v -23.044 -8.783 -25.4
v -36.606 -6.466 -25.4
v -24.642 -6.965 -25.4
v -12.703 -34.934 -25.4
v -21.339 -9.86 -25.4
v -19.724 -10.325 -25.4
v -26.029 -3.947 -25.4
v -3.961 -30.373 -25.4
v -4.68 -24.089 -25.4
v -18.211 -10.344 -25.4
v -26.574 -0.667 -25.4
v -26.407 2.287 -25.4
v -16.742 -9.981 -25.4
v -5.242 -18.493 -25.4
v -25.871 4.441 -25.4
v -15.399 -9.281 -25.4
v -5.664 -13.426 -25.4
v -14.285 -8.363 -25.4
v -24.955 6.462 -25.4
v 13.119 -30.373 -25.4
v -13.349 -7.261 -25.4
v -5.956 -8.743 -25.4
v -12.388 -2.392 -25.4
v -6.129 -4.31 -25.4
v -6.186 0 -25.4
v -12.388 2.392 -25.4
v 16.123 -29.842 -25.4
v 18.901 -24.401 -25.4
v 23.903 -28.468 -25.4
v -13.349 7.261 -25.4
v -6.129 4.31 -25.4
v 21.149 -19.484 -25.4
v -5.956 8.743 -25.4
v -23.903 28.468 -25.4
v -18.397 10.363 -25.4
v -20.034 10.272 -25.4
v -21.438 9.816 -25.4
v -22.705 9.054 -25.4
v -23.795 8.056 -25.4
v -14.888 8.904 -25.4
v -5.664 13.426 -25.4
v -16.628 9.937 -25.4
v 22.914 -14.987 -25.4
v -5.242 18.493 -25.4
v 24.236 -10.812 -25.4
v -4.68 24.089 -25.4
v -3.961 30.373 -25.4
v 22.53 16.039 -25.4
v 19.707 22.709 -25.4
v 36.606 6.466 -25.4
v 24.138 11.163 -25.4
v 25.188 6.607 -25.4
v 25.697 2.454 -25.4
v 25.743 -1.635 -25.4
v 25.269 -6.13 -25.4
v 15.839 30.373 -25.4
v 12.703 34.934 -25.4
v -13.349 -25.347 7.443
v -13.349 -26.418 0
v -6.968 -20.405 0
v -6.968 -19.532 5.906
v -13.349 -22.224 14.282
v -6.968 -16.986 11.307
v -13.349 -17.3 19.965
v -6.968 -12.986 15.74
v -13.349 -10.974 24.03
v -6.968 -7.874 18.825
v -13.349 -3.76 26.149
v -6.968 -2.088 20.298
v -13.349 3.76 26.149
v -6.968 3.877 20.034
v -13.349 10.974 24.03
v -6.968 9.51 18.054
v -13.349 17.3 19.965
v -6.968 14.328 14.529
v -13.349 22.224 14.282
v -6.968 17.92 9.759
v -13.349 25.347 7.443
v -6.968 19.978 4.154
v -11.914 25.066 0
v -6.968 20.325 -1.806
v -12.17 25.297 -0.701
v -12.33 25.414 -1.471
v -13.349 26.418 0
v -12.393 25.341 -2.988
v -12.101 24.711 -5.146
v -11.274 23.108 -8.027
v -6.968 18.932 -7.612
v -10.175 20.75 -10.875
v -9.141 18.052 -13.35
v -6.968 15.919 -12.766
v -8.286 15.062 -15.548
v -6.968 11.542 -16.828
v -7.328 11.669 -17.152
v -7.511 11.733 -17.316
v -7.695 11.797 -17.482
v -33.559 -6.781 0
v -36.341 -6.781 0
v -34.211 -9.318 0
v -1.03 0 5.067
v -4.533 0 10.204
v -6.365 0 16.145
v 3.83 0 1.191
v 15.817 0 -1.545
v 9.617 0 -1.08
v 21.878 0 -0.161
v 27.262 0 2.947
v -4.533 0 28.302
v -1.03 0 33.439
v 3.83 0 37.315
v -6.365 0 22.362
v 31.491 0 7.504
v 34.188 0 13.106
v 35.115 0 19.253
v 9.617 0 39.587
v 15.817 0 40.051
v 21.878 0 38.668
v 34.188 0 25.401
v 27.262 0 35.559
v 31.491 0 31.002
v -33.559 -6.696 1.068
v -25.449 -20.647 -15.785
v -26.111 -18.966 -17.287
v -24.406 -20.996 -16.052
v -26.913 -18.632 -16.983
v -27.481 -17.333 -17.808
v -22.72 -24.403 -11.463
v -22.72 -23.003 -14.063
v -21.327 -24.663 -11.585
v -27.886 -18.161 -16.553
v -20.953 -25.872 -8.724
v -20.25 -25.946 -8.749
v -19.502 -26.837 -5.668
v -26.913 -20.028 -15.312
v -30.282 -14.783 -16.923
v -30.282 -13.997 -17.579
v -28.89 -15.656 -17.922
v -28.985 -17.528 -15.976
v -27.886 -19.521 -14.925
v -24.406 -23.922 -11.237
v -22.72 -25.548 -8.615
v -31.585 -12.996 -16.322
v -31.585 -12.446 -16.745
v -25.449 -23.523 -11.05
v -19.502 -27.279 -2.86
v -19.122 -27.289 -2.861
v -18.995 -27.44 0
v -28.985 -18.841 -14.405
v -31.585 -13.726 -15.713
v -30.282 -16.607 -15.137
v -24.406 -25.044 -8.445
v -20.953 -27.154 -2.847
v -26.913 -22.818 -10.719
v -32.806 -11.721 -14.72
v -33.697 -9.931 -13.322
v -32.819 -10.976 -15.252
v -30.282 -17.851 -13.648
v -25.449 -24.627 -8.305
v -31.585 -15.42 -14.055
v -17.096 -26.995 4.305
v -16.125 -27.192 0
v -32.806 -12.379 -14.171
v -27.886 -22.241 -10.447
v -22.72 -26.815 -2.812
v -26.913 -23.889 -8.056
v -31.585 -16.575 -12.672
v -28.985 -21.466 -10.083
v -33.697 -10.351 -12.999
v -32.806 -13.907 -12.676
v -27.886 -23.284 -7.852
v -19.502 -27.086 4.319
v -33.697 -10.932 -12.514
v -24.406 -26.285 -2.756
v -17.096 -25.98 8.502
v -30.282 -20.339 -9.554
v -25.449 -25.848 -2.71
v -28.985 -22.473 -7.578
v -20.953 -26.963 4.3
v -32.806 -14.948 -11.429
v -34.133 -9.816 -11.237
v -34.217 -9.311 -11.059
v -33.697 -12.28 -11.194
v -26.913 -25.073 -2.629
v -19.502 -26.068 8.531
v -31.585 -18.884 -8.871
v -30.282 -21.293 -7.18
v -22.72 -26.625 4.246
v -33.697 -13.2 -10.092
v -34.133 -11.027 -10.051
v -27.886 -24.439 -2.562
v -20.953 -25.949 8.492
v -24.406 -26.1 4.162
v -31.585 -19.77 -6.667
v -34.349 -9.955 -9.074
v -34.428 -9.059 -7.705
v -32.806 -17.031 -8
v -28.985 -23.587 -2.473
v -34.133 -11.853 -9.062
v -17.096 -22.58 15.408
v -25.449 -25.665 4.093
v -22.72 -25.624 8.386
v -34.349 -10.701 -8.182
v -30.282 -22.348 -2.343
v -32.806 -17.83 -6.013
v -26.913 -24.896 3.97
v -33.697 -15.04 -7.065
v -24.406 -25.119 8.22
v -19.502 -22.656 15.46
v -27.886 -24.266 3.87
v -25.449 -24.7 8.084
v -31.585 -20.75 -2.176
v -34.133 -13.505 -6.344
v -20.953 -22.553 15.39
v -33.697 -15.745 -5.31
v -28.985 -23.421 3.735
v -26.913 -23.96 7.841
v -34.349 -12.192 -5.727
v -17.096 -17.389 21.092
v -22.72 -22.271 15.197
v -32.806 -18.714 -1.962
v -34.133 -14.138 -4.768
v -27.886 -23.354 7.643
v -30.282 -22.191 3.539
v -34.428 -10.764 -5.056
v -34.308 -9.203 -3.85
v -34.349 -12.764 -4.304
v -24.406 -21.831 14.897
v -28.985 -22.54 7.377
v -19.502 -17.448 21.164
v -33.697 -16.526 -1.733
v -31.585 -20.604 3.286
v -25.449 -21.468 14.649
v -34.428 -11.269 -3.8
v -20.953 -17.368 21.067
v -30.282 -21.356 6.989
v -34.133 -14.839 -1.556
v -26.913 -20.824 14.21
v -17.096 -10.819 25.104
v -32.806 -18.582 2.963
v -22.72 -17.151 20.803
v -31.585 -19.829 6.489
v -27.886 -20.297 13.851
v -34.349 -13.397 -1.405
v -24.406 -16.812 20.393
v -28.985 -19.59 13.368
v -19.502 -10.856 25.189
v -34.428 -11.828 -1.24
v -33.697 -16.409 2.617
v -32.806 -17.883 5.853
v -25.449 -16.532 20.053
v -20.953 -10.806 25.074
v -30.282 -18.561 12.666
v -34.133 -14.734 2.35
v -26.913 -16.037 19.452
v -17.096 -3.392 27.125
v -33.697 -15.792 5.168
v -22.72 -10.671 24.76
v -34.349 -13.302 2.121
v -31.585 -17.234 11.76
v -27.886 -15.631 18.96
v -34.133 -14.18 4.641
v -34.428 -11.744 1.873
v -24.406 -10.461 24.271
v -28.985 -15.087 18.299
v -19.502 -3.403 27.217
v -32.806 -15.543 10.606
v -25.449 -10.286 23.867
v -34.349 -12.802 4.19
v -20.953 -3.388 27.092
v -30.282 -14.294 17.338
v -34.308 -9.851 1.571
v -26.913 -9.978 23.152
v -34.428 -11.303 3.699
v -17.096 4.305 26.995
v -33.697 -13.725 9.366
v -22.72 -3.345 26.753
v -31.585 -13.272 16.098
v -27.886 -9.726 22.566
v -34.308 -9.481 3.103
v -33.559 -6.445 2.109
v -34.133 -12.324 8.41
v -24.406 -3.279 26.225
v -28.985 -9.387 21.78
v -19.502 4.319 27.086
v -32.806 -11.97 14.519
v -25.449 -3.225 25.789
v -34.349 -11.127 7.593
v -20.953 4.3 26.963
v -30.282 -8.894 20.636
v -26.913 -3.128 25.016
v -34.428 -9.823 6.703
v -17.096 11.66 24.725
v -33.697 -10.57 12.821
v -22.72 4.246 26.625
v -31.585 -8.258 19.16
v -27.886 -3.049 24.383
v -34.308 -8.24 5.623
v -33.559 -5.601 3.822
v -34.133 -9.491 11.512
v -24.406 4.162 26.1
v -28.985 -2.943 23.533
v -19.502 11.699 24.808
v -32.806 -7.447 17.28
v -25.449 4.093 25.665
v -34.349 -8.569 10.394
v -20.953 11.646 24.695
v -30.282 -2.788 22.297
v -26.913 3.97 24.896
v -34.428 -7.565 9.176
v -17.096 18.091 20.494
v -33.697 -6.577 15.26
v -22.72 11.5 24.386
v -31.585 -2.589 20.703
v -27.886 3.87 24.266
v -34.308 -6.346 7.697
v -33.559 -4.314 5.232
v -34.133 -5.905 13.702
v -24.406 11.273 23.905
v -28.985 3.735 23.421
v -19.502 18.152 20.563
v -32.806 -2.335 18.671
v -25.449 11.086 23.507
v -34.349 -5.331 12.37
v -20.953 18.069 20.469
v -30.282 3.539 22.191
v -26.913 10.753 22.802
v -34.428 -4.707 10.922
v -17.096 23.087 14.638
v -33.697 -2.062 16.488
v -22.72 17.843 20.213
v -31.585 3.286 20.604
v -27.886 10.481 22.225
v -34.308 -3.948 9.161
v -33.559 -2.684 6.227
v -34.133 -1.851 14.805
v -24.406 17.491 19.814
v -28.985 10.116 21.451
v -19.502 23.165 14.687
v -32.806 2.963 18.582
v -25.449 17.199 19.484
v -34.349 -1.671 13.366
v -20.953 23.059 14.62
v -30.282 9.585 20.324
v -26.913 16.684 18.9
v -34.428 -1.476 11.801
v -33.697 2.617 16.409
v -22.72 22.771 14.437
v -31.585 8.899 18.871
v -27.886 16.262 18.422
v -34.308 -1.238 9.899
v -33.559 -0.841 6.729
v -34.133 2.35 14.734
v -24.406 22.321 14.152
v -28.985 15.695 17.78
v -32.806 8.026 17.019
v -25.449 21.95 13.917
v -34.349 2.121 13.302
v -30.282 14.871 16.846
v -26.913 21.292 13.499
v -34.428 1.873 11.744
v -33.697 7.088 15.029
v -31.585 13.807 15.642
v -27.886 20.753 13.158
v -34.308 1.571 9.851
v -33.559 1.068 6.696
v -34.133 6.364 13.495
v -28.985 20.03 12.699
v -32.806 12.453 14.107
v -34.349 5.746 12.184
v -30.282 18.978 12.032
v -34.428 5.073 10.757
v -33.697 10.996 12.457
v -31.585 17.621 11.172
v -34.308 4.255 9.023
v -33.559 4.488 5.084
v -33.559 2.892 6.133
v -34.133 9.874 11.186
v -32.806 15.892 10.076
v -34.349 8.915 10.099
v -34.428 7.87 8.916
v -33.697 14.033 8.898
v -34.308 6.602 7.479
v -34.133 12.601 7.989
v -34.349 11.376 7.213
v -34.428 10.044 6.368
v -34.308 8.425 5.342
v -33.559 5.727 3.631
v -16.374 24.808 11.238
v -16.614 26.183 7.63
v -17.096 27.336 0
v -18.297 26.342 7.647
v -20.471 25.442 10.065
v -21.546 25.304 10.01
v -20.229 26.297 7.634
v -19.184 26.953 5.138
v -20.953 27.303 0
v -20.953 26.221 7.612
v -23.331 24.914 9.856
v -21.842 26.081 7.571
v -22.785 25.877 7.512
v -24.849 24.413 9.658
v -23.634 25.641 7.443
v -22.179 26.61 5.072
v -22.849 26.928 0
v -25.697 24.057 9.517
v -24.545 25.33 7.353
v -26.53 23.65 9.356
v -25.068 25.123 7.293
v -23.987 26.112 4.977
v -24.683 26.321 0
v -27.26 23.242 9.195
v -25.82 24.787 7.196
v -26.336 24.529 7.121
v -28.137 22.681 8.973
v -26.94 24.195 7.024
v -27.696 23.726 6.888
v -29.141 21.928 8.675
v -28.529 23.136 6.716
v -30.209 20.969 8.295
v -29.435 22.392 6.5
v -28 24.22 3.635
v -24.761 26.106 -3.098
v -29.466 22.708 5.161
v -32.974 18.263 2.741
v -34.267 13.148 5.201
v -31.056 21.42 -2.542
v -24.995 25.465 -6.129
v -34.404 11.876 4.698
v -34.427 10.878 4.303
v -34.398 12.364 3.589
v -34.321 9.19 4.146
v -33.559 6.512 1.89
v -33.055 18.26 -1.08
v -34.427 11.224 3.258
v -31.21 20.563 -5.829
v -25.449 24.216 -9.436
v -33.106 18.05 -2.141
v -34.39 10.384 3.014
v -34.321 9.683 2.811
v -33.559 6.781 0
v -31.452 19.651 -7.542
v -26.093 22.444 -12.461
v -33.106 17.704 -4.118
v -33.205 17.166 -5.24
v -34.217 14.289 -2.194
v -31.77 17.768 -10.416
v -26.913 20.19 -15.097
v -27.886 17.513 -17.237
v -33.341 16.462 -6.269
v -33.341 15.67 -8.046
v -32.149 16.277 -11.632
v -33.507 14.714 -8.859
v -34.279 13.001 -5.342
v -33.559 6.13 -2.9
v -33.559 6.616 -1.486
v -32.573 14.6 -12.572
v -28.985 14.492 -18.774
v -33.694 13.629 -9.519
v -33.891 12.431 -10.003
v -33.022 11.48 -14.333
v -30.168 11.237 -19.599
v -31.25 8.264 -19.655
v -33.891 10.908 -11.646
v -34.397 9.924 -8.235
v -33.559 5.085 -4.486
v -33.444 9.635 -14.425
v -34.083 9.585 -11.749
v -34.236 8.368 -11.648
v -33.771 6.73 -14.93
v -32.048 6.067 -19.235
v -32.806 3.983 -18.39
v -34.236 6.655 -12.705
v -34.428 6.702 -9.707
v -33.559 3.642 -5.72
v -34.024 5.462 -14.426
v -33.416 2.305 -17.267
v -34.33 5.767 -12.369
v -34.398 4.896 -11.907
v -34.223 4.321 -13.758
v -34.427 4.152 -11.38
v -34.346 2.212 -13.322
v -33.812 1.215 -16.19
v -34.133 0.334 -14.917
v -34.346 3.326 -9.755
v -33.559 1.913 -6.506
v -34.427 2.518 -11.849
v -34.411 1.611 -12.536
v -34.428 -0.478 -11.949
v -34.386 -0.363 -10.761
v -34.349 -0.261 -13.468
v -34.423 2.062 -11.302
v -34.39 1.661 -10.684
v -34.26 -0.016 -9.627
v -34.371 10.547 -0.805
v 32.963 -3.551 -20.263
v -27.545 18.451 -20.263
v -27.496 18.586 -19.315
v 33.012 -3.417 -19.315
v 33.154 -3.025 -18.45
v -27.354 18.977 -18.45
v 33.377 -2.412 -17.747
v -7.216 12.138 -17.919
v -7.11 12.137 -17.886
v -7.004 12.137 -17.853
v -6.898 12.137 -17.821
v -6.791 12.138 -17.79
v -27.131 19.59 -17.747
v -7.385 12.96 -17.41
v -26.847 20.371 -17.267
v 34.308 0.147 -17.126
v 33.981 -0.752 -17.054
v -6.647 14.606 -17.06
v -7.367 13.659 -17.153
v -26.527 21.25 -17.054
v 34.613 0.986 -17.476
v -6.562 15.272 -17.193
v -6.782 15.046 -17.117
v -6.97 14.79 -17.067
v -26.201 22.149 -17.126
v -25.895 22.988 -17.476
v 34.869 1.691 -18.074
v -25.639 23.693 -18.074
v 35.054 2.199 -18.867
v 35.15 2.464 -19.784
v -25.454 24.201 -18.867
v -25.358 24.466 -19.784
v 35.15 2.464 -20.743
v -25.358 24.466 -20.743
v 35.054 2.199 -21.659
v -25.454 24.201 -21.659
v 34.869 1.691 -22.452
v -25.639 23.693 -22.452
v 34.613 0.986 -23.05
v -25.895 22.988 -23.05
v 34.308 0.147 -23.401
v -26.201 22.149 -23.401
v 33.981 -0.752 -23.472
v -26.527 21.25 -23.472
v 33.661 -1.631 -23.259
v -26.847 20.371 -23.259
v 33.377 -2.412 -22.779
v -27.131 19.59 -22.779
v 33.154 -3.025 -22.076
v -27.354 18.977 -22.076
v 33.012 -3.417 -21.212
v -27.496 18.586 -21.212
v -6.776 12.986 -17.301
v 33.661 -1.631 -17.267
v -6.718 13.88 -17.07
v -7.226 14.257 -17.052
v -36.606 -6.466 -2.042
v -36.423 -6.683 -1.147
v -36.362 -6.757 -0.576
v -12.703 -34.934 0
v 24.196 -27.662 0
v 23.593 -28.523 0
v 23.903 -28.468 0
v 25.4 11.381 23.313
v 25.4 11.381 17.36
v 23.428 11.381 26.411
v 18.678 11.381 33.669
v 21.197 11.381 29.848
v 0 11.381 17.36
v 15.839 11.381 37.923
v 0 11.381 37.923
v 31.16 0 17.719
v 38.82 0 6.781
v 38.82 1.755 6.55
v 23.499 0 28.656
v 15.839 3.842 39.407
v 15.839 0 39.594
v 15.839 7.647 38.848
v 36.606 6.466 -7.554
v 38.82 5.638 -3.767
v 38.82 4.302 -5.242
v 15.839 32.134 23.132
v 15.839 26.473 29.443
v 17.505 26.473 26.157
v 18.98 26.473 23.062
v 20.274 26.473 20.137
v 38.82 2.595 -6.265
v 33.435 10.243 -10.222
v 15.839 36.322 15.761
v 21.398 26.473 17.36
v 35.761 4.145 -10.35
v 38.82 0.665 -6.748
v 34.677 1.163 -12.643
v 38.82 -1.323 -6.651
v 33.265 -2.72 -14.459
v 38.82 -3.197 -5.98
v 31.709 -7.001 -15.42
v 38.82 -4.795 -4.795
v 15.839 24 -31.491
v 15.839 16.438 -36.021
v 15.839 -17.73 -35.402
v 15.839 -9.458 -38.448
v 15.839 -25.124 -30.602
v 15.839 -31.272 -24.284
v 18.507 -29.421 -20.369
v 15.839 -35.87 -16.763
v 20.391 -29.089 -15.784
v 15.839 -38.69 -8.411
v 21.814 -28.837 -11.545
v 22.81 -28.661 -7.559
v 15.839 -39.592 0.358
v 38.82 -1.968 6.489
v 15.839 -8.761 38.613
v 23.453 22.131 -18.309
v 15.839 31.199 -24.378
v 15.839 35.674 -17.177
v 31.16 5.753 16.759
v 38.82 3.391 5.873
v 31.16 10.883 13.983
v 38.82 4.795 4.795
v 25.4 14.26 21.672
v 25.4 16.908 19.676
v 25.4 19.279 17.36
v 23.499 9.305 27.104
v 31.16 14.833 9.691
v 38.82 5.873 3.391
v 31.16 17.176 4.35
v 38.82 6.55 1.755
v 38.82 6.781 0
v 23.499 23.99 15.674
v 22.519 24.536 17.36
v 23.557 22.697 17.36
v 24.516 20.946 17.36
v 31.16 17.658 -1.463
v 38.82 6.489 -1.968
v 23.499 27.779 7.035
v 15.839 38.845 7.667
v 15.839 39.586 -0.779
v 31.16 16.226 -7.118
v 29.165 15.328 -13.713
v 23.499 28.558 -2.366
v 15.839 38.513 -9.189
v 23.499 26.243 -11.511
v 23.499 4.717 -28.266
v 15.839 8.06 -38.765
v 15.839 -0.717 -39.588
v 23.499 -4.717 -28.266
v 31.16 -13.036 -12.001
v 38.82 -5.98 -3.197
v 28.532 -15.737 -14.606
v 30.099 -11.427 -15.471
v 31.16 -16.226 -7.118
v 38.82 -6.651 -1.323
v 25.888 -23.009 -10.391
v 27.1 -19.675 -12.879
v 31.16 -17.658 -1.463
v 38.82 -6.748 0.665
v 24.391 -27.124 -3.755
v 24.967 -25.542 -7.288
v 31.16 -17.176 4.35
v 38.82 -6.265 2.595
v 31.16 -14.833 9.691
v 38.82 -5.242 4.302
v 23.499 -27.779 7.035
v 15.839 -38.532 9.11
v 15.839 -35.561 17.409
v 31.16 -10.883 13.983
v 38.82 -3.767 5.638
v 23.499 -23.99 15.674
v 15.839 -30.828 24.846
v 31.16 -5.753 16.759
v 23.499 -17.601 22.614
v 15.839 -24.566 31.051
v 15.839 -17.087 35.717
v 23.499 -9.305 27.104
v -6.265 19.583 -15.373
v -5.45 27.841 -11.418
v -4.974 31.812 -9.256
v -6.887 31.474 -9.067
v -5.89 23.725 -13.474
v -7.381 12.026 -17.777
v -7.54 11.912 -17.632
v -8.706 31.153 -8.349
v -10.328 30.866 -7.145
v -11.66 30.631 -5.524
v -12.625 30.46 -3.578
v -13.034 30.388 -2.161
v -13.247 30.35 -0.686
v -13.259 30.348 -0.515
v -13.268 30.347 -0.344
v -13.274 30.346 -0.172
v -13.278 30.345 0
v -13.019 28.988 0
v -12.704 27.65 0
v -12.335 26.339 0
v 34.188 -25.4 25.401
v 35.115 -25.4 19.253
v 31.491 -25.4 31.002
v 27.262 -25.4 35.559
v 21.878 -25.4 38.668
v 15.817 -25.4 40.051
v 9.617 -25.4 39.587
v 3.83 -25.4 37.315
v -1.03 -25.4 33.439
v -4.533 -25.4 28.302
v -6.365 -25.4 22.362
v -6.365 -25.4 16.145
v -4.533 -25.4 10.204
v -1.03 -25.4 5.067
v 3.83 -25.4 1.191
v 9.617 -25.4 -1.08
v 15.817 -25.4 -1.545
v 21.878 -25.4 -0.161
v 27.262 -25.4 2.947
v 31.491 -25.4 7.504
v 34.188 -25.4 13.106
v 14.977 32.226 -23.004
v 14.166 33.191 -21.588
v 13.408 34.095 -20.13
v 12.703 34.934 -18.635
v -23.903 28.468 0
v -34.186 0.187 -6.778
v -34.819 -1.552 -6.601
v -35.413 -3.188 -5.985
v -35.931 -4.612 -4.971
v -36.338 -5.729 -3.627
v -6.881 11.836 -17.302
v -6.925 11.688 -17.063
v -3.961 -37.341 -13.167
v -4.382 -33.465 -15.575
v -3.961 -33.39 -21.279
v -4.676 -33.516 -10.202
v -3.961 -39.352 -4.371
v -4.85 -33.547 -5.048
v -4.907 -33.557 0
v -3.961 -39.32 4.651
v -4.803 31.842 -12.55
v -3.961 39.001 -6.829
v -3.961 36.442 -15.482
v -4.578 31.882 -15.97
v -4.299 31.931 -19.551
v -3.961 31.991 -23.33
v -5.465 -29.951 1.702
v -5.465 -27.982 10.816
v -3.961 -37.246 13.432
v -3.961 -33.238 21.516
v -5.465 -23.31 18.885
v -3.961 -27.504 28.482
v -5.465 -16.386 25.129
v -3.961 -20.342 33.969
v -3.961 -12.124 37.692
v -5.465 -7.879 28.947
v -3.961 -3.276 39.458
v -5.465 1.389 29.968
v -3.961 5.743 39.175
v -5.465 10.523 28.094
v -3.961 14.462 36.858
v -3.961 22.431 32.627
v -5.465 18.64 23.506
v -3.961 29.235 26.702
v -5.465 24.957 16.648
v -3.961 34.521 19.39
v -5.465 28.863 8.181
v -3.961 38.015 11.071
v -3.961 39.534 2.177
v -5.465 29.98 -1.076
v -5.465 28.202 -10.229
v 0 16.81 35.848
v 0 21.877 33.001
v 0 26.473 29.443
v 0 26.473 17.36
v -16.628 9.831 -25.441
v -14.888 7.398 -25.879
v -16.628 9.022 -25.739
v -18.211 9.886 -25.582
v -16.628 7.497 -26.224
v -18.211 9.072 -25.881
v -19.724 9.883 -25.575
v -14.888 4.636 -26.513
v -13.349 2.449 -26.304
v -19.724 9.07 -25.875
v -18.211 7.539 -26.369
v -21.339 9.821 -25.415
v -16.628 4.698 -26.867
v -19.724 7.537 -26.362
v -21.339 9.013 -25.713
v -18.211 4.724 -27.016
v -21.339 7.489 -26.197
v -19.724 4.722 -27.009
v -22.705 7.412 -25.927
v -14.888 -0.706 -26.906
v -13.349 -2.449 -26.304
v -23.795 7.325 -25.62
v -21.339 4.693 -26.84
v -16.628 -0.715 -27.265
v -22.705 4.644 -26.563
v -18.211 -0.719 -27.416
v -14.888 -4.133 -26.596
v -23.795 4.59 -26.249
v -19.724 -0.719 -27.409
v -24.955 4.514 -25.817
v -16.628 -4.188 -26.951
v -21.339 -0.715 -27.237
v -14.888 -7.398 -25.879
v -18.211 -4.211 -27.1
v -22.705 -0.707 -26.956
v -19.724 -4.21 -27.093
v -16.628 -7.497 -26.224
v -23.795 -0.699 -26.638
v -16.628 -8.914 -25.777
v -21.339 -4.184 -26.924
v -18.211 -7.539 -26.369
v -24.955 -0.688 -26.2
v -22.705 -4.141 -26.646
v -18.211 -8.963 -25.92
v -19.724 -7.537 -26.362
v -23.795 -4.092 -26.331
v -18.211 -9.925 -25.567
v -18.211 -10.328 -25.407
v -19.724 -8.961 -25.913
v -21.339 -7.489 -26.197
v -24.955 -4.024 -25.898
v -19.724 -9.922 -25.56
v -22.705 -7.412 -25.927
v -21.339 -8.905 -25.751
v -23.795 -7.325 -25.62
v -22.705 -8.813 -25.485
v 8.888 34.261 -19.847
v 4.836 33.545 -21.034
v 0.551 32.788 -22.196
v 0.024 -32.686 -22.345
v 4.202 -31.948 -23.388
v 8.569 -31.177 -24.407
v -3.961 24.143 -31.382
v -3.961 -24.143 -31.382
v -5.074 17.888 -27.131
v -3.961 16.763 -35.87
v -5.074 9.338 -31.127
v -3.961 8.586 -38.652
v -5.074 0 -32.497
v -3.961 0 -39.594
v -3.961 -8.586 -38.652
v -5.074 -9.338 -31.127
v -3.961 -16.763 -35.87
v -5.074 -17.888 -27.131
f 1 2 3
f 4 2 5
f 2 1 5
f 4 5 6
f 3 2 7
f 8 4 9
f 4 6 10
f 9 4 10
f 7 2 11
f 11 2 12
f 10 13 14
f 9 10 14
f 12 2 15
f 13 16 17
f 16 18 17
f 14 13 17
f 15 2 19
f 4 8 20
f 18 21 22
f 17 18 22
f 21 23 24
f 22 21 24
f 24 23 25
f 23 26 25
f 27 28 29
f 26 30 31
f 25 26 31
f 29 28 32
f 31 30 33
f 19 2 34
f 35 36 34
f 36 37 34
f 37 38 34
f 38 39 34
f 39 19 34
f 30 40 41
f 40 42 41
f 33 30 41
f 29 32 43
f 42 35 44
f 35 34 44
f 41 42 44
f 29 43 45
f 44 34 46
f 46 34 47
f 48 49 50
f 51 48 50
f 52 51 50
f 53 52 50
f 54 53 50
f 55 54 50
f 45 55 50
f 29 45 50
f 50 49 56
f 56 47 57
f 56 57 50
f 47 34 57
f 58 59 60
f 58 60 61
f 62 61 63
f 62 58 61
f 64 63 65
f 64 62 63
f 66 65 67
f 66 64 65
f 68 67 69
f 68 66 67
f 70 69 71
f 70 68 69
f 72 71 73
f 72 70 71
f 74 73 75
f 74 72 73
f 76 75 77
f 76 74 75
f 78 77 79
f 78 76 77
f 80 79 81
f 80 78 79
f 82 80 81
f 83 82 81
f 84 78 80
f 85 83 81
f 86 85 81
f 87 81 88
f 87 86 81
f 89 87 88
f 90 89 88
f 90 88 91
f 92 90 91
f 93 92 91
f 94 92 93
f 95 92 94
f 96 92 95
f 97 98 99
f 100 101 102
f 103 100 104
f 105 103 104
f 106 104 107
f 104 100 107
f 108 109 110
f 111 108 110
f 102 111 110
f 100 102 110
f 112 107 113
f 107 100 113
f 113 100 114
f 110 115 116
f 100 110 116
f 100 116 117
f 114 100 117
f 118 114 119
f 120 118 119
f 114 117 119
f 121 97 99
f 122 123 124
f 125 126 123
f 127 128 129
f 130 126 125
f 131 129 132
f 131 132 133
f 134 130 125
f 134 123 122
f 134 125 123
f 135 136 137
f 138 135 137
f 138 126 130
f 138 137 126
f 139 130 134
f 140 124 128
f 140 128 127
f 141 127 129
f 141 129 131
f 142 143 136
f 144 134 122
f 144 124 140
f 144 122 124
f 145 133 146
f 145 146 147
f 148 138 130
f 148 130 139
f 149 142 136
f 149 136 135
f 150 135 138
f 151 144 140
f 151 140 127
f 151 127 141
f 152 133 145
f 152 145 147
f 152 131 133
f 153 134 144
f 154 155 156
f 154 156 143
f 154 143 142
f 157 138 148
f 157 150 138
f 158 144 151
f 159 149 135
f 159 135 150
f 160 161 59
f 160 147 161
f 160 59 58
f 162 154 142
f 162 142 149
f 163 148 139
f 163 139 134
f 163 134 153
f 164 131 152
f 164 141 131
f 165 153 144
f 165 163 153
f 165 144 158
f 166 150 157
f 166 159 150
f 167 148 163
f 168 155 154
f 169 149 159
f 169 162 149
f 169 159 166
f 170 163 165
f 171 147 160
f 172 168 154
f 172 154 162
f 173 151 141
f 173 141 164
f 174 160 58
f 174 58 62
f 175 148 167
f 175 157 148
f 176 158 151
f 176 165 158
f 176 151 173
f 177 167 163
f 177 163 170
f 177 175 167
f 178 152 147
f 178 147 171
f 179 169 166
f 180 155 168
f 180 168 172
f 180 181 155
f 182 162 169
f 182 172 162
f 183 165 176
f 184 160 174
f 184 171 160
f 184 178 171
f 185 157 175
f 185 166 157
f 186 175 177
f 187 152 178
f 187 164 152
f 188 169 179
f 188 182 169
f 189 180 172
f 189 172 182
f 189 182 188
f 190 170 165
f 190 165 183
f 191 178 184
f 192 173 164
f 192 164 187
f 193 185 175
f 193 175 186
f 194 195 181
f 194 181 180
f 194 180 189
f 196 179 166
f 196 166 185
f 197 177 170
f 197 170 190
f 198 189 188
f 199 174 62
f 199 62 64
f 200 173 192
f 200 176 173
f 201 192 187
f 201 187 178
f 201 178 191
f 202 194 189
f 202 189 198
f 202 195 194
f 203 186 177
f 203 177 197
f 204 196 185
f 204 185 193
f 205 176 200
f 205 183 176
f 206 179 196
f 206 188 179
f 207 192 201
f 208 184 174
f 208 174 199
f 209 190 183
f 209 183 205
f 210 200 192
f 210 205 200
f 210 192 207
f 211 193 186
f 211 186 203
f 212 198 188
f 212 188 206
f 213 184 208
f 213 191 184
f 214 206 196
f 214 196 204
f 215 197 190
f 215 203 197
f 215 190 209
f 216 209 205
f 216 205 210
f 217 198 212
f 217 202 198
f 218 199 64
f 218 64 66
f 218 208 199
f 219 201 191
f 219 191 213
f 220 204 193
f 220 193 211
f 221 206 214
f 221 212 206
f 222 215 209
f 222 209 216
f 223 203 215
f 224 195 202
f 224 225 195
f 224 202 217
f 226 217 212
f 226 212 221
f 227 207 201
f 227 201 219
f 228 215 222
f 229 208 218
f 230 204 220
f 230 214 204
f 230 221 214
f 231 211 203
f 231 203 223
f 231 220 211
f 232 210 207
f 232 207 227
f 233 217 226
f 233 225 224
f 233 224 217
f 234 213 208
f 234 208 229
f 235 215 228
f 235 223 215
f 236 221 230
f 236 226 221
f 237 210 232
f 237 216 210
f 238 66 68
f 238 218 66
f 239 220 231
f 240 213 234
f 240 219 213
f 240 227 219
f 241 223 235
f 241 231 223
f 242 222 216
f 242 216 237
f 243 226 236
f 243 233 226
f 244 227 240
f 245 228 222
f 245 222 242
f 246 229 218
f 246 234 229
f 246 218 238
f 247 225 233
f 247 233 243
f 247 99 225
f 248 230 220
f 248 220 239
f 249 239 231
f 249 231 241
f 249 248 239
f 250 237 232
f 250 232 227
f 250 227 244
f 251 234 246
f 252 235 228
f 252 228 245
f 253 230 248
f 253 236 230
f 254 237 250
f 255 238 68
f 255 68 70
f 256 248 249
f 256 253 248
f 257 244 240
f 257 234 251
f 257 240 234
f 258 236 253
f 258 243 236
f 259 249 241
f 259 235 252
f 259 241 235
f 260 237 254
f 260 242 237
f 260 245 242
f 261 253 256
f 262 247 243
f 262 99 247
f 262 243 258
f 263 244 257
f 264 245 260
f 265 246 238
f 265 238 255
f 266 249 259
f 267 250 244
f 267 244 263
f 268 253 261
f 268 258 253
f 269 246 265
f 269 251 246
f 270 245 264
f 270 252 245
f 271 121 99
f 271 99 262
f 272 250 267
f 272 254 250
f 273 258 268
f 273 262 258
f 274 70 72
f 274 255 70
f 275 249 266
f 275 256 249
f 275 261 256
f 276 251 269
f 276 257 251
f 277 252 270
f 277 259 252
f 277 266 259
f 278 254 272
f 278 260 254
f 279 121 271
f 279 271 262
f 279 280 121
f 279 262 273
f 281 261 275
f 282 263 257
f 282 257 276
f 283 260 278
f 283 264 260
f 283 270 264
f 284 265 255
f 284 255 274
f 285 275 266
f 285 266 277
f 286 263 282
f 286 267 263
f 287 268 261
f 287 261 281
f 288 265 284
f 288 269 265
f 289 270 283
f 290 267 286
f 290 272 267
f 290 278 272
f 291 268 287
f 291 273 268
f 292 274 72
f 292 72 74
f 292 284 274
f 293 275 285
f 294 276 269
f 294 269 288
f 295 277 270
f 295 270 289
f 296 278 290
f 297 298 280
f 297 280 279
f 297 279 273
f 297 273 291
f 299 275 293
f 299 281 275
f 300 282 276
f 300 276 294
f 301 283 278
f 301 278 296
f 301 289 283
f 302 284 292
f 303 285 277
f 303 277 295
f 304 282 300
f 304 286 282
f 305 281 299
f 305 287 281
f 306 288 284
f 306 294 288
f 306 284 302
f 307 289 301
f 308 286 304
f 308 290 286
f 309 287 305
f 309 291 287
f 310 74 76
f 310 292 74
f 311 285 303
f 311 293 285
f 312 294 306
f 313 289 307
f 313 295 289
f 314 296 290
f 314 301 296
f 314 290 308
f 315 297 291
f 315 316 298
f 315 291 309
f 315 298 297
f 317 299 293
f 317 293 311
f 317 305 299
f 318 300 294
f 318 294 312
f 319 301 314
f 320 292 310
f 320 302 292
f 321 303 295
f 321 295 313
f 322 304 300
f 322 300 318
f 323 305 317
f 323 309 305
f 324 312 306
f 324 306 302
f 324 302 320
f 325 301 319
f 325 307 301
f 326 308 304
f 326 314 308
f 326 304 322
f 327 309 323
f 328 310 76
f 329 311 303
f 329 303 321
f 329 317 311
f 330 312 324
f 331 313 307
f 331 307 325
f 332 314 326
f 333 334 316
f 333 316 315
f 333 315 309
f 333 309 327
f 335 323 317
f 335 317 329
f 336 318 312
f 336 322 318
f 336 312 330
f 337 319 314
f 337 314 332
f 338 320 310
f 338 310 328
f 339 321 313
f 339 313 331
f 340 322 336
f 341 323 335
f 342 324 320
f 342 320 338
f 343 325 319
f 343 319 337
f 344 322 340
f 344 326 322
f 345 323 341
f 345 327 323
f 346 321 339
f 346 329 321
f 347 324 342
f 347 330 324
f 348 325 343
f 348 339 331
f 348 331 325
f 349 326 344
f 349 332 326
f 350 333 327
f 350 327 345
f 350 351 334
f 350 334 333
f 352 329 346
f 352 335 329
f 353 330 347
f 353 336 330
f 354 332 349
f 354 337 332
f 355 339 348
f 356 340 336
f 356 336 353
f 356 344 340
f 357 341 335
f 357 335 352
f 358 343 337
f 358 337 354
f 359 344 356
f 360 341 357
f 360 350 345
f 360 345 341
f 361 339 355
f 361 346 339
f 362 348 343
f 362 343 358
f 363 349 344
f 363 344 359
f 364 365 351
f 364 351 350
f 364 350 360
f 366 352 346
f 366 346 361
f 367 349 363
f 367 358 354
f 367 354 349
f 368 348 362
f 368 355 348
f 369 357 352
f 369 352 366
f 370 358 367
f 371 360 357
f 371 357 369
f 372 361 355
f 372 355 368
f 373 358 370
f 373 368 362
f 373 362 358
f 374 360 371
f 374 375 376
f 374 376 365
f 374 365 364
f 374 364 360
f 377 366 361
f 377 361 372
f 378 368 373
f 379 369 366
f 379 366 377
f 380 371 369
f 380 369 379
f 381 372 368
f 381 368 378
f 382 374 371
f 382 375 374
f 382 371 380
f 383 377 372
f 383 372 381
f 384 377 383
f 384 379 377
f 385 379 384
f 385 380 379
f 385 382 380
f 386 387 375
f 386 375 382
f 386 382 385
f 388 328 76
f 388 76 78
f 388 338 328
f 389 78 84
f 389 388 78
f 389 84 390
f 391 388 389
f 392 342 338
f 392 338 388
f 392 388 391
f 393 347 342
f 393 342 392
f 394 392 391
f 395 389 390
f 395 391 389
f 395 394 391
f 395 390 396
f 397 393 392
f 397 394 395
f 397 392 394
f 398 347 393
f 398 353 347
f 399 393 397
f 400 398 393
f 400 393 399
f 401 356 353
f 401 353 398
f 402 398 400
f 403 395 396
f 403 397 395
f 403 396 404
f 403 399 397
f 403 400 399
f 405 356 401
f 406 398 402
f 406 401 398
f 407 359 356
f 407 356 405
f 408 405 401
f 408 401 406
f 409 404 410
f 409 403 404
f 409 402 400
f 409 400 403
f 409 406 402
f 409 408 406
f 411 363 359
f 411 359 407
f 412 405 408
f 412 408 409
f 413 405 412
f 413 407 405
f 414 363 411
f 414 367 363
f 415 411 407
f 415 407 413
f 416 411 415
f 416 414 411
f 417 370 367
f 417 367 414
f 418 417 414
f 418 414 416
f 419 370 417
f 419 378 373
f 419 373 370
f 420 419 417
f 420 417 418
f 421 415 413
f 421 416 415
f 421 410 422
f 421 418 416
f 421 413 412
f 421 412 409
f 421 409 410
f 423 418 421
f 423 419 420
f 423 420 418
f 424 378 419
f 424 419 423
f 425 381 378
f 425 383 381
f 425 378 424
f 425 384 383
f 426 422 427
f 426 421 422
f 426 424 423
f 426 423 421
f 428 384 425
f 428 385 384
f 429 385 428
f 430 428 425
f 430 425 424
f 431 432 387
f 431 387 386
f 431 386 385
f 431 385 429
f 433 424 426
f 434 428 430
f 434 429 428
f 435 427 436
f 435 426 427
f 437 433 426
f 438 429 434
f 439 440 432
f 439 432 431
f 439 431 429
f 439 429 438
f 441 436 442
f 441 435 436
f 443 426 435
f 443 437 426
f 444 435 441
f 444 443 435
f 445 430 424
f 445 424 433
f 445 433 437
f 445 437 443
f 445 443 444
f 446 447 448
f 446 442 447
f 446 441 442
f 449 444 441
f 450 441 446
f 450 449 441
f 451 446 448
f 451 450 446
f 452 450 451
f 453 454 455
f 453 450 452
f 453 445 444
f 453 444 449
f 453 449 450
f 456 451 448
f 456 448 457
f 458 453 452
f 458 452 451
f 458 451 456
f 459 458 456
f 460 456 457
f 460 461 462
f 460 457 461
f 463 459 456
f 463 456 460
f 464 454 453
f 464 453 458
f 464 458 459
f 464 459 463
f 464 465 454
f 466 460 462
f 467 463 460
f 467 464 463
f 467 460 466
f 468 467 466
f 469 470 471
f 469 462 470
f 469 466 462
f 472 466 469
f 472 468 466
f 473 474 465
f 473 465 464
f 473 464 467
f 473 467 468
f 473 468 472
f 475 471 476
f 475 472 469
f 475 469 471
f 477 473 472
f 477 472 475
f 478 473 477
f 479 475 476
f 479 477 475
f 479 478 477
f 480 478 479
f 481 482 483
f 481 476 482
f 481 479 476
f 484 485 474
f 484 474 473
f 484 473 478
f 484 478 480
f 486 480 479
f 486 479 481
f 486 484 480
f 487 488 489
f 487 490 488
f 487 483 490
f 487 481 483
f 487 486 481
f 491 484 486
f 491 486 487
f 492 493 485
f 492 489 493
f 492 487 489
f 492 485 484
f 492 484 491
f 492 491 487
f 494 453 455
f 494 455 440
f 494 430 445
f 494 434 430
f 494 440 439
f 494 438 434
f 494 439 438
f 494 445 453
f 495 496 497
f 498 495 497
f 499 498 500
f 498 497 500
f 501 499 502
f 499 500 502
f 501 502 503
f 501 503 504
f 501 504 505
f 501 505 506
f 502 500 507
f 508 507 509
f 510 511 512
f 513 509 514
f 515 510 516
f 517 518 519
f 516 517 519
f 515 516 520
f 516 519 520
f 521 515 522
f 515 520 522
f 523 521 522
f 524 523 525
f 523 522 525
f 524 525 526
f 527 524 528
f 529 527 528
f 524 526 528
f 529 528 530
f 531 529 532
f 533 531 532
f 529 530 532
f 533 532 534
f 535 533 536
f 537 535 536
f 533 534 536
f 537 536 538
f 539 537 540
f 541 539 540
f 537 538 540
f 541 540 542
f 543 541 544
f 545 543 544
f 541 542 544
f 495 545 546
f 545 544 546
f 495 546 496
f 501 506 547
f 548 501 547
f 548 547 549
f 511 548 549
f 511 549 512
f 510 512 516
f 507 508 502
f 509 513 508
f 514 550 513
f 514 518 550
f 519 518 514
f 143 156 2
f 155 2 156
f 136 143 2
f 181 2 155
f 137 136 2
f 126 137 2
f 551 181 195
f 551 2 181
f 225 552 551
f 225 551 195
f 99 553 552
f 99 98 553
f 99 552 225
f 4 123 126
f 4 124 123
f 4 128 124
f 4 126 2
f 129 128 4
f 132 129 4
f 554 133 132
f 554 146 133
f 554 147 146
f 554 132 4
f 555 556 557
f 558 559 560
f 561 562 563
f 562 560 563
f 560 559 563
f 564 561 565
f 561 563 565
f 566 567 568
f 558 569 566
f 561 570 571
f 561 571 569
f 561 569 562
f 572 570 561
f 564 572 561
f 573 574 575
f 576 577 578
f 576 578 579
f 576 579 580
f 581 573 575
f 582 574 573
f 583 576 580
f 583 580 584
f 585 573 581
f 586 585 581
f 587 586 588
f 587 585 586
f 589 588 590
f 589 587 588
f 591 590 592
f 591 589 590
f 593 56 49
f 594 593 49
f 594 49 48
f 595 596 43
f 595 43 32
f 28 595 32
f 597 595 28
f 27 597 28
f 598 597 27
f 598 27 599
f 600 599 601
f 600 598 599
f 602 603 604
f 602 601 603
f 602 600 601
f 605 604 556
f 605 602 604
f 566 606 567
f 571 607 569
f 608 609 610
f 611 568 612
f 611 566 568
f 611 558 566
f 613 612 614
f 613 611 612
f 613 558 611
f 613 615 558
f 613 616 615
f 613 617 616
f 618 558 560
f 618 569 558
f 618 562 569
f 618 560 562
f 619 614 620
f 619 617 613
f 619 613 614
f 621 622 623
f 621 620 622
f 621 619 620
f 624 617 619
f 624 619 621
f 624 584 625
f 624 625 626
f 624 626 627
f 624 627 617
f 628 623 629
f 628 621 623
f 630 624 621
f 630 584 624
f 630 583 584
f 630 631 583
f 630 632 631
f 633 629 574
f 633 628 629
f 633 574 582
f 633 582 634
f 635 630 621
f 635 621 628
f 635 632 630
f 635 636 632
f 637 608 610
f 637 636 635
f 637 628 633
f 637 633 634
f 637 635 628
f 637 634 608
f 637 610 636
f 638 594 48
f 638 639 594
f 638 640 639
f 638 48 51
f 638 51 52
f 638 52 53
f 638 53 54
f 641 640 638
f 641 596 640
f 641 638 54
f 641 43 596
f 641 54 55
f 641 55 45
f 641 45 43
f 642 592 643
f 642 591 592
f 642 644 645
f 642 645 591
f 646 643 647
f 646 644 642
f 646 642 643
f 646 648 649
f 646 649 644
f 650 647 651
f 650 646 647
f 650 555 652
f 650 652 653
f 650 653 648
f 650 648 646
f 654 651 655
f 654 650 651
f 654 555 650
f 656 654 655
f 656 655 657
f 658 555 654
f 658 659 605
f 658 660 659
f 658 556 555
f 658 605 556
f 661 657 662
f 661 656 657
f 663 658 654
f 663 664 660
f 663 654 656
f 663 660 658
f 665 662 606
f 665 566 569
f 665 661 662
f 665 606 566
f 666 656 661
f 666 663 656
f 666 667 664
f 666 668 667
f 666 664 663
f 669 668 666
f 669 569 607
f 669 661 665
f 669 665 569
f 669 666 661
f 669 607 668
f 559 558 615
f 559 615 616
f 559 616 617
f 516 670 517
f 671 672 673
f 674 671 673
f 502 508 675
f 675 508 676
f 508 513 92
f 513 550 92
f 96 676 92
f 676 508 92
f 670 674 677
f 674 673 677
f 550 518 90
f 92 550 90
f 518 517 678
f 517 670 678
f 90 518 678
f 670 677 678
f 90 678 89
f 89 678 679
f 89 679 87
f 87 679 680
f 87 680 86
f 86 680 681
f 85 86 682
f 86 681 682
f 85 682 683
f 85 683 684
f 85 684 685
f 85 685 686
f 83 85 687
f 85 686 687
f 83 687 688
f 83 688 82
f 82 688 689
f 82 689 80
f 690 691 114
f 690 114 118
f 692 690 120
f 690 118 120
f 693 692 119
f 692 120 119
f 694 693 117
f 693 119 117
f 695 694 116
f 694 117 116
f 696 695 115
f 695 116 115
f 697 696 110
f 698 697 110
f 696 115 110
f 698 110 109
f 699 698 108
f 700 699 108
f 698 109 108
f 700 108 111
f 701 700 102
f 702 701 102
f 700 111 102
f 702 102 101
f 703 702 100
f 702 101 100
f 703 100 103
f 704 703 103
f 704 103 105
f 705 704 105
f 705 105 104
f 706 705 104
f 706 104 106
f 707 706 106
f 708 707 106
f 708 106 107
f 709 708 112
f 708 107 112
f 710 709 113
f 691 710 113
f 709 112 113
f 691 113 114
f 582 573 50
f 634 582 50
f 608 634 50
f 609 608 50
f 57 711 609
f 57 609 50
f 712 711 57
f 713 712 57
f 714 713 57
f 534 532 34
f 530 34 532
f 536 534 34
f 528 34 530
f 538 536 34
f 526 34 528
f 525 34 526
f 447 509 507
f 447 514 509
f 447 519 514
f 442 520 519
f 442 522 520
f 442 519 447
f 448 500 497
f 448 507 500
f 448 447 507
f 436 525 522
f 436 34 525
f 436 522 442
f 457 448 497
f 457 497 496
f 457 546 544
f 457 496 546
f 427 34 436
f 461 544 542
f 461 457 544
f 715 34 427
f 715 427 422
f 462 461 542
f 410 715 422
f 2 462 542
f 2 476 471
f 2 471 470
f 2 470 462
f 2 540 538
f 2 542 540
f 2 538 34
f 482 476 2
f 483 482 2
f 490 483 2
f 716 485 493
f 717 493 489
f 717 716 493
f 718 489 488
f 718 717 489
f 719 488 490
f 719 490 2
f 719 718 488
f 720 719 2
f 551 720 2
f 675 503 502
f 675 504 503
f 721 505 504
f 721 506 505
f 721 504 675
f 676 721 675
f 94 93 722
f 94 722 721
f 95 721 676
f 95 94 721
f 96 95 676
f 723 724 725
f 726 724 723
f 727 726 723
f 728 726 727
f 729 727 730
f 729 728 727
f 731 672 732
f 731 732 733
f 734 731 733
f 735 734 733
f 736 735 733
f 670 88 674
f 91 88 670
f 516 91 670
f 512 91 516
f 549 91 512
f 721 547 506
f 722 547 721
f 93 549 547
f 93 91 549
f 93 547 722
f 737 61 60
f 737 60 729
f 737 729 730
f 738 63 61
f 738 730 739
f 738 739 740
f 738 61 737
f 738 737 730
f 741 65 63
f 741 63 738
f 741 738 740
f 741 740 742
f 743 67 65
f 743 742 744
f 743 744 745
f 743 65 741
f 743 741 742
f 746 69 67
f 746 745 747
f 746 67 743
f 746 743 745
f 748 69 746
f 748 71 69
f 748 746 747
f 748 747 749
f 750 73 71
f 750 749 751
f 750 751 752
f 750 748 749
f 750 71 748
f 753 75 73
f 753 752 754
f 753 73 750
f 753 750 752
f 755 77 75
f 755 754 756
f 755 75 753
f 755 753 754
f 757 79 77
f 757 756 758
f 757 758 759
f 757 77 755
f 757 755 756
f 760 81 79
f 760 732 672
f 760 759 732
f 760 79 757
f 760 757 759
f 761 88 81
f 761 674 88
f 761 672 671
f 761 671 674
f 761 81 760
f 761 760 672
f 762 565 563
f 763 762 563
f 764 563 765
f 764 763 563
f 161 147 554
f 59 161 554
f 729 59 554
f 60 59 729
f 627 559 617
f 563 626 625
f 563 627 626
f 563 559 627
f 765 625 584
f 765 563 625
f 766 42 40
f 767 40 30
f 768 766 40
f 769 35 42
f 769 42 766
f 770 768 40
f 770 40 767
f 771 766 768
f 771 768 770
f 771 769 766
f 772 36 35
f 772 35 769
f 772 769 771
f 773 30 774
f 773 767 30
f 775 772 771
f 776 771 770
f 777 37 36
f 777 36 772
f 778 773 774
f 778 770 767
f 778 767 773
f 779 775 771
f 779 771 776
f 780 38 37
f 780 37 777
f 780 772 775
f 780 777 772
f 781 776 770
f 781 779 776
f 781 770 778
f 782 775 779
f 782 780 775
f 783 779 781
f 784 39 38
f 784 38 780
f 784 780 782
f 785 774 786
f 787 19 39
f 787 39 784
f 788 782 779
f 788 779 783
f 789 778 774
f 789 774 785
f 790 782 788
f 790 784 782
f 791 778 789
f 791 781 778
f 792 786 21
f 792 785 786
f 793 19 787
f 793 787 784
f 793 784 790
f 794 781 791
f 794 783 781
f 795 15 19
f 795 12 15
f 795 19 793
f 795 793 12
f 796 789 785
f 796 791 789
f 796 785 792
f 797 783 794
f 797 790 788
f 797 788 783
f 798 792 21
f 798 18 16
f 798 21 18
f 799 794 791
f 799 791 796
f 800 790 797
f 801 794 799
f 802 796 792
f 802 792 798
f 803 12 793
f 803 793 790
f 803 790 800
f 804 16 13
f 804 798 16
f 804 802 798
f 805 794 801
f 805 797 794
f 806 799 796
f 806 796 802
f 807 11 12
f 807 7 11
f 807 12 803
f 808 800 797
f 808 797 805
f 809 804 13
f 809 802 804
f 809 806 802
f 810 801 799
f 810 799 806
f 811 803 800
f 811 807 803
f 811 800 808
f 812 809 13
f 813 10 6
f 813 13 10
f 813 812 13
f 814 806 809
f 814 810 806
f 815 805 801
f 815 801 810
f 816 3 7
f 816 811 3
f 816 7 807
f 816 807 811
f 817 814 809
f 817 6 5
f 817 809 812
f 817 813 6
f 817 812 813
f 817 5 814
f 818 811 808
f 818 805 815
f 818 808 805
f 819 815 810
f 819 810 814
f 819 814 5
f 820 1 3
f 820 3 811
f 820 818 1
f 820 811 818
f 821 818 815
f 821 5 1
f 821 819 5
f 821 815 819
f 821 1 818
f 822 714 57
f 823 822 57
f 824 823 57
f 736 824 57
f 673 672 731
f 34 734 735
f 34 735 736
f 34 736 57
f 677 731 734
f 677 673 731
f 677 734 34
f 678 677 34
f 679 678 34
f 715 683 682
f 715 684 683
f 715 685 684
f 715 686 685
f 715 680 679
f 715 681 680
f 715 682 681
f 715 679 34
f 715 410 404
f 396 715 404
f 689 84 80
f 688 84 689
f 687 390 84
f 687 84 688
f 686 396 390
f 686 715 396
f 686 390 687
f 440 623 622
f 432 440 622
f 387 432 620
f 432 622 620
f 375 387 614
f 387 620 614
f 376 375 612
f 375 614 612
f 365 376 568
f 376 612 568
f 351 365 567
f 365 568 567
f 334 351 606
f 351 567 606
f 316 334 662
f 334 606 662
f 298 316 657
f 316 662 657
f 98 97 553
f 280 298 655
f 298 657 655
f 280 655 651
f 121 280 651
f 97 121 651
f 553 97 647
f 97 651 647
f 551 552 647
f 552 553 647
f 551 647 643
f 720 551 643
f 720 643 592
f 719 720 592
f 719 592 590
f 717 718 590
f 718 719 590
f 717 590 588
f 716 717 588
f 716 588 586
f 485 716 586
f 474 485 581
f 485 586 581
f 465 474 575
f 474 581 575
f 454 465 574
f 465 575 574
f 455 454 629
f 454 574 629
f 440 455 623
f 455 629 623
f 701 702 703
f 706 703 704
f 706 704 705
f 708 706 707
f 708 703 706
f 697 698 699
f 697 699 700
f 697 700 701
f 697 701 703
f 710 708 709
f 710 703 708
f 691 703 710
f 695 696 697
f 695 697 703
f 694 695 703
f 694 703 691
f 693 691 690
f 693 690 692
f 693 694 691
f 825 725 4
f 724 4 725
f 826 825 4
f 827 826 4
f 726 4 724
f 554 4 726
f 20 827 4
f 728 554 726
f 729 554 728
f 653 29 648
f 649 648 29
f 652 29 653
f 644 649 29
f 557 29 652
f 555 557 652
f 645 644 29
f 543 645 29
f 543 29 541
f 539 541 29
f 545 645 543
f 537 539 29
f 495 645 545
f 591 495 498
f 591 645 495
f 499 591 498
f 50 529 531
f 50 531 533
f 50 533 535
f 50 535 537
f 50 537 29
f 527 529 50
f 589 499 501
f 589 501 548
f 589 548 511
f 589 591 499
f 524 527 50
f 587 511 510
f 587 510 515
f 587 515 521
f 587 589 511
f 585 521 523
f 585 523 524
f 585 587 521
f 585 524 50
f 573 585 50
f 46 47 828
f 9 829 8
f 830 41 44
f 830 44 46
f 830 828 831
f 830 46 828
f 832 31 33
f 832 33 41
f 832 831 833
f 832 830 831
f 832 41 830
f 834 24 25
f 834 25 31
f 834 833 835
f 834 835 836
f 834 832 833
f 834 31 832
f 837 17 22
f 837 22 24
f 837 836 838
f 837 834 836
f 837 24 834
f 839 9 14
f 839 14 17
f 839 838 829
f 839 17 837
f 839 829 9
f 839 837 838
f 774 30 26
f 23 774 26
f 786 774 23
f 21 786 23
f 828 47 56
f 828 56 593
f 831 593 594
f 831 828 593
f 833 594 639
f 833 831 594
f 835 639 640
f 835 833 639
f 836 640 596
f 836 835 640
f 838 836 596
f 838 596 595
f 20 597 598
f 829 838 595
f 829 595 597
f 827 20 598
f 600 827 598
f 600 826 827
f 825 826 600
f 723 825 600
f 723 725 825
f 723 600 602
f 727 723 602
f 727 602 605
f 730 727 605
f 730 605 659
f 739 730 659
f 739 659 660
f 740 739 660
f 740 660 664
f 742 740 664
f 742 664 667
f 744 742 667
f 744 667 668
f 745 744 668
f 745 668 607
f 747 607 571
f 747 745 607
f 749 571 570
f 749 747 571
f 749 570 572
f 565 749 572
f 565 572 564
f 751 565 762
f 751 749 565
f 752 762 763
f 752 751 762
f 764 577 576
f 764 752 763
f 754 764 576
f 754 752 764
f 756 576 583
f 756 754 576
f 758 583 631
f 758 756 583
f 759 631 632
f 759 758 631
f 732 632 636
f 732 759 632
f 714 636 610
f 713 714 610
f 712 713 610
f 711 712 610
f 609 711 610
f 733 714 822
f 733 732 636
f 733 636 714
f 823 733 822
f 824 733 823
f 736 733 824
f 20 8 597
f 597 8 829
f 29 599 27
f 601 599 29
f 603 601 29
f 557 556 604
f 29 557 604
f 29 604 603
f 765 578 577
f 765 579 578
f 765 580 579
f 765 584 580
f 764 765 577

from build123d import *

# Parameters (mm, degrees)
F2_DEPTH  = 25.4
F3_R      = 8.143310864
F4_DEPTH  = 25.4
F7_R      = 6.7810250719
F8_DEPTH  = 76.2
F9_R      = 3.2182175961
F10_DEPTH = 68.326
F11_W     = 15.0923235342
F11_H     = 22.7762702852
F12_DEPTH = 25.4
F13_R     = 20.8563565083
F14_DEPTH = 25.4


with BuildPart() as f2:
    # F0 (on Top) → F2 (new body)
    with BuildSketch(Plane.XY):
        Polygon((36.6055454756, 6.4661289451), (12.7029408072, 34.9343967738), (-23.9026046684, 28.4682678287), (-36.6055454756, -6.4661289451), (-12.7029408072, -34.9343967738), (23.9026046684, -28.4682678287), align=None)
    extrude(amount=-F2_DEPTH)

    # F3 (on line) → F4 (cut)
    with BuildSketch(Plane(origin=(-4.199873948, 23.775999226, 13.9395968422), x_dir=(-0.9885878542, -0.1299569007, -0.0761922469), z_dir=(-0.1506454597, 0.8528223411, 0.5))):
        with Locations((1.0608994635, -15.9425735474)):
            Circle(F3_R)
    extrude(amount=-F4_DEPTH, mode=Mode.SUBTRACT)

    # F5 (on Front) → F6 (revolve)
    with BuildSketch(Plane.XZ):
        with BuildLine():
            Line((-6.9683259353, 20.4054266214), (-13.349192217, 26.417594403))
            ThreePointArc((-13.349192217, 26.417594403), (-32.286852793, 19.7760065738), (-28.8728754967, 0))
            Line((-28.8728754967, 0), (43.5695797205, 0))
            Line((43.5695797205, 0), (15.8389825374, 39.5940095186))
            Line((15.8389825374, 39.5940095186), (-3.9613735862, 39.5940095186))
            Line((-3.9613735862, 39.5940095186), (-6.9683259353, 20.4054266214))
        make_face()
    revolve(axis=Axis((7.3483521119, 0, 0), (-1, 0, 0)))

    # F7 (on Right) → F8 (cut, symmetric)
    with BuildSketch(Plane.YZ):
        Circle(F7_R)
    extrude(amount=F8_DEPTH, both=True, mode=Mode.SUBTRACT)

    # F9 (on face) → F10 (cut)
    with BuildSketch(Plane(origin=(-30.254075072, 11.0010694418, 0), x_dir=(-0.3417317485, -0.9397975378, 0), z_dir=(-0.9397975378, 0.3417317485, 0))):
        with Locations((-11.1456587911, -20.2631615102)):
            Circle(F9_R)
    extrude(amount=-F10_DEPTH, mode=Mode.SUBTRACT)

    # F11 (on Right) → F12 (cut)
    with BuildSketch(Plane.YZ):
        with Locations((18.9267494716, 28.7478743121)):
            Rectangle(F11_W, F11_H)
    extrude(amount=F12_DEPTH, mode=Mode.SUBTRACT)


with BuildPart() as f14:
    # F13 (on Front) → F14 (new body)
    with BuildSketch(Plane.XZ):
        with Locations((14.2583092675, 19.2532576621)):
            Circle(F13_R)
    extrude(amount=F14_DEPTH)


solid = Compound([f2.part, f14.part])
